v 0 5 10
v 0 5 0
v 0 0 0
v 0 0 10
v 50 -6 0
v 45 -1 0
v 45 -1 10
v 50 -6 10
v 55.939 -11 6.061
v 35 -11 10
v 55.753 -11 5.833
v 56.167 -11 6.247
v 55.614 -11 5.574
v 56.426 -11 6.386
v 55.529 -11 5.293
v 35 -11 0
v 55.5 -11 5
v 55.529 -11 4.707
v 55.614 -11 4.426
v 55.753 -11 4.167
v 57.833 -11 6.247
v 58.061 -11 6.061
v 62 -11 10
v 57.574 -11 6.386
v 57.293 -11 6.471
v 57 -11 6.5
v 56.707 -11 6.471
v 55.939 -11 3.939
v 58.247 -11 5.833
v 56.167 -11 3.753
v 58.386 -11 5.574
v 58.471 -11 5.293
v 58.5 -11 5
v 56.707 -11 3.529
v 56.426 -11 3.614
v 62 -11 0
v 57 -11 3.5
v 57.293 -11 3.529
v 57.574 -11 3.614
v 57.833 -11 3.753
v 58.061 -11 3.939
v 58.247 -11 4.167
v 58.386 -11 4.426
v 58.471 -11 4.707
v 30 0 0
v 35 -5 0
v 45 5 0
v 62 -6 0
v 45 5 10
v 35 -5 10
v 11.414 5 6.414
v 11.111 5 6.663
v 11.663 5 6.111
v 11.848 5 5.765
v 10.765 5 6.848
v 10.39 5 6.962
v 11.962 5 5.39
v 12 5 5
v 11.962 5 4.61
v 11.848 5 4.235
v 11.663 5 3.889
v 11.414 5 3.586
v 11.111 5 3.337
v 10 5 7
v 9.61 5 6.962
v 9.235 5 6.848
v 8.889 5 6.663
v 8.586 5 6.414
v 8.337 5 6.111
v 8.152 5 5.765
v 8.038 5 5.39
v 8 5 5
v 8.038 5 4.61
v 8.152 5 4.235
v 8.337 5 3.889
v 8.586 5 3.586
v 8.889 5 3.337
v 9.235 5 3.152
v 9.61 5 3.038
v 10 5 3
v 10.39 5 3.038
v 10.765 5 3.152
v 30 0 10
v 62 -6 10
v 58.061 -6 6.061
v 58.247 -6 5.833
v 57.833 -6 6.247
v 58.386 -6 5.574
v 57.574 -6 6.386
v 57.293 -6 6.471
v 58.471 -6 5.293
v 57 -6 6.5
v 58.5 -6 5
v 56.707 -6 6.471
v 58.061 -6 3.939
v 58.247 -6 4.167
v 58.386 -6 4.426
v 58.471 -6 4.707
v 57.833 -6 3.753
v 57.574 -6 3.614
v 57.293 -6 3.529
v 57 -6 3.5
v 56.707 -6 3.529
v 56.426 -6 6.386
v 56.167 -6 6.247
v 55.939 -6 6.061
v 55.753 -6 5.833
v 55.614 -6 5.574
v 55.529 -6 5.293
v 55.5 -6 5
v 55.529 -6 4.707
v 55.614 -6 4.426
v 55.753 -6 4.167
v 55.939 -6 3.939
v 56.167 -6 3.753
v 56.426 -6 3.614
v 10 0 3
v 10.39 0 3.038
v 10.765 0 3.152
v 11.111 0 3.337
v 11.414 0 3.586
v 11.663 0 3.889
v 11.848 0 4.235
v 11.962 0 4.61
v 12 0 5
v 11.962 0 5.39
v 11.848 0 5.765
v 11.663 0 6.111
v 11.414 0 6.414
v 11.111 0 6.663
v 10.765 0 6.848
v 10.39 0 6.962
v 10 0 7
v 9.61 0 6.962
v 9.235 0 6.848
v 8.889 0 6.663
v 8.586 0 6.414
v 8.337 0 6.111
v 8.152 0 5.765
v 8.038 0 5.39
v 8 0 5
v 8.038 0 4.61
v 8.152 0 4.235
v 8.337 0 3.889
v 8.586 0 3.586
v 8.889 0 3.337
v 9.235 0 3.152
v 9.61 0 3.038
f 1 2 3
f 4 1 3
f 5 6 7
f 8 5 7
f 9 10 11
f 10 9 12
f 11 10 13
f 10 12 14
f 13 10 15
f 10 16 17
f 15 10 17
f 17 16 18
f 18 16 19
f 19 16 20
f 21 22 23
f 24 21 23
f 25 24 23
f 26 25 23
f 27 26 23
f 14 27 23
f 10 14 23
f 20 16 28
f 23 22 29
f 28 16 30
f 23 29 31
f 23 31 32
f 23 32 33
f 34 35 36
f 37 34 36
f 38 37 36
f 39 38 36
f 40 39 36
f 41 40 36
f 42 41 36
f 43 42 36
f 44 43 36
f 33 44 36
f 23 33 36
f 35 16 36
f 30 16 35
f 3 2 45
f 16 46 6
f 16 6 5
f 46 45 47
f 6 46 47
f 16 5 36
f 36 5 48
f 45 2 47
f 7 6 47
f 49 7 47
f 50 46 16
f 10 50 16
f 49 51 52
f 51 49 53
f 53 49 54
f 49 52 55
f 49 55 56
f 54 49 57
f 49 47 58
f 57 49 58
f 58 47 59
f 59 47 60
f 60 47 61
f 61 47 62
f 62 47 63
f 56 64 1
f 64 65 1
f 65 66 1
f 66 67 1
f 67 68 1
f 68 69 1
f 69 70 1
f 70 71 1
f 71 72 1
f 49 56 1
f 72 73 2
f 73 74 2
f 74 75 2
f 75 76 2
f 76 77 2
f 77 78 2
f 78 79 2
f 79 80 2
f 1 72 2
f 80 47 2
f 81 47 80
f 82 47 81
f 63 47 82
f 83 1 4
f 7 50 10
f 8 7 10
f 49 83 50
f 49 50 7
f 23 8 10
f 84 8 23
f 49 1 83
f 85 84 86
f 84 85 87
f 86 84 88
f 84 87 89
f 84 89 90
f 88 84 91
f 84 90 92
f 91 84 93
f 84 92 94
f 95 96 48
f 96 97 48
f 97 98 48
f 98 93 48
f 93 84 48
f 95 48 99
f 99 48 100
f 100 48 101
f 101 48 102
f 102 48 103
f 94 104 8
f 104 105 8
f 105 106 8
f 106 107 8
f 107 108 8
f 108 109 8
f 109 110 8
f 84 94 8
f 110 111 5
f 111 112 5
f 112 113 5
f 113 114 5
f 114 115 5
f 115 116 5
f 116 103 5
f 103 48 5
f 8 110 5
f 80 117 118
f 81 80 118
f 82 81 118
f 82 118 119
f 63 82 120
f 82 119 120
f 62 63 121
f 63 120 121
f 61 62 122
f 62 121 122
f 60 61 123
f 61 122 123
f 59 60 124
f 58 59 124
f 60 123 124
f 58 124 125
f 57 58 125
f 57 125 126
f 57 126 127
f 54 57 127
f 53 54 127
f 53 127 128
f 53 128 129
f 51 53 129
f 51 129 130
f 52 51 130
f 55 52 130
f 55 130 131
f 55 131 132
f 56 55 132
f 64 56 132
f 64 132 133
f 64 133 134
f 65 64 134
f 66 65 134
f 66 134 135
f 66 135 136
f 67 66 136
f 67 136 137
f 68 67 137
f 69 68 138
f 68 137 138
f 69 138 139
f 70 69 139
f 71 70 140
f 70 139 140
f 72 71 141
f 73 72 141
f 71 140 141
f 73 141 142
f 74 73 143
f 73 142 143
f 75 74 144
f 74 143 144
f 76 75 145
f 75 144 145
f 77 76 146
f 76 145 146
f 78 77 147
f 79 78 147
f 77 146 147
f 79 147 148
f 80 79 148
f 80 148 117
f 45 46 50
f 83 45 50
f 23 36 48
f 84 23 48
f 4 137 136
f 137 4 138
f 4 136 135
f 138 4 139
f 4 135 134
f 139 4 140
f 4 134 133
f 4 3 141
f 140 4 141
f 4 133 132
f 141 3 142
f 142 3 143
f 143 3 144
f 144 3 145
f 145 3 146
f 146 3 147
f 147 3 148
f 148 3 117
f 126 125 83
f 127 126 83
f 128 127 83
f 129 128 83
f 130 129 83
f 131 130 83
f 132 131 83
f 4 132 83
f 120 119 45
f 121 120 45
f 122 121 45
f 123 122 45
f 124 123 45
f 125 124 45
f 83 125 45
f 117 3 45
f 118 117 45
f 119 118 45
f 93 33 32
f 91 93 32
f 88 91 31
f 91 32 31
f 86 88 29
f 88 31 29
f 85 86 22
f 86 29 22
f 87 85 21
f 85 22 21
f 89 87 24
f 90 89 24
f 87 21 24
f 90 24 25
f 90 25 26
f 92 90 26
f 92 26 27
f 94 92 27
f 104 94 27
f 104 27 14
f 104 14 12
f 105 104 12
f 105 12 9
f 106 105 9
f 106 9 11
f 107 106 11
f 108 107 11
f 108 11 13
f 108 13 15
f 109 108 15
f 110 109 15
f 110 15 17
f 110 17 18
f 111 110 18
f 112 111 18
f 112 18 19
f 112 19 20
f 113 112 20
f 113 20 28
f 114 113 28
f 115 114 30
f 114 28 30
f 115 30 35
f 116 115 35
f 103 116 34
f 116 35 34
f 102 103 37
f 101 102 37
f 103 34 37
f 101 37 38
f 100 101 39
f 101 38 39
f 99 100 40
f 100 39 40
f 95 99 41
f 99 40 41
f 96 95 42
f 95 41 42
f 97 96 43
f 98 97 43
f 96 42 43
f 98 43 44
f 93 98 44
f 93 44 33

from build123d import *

# Parameters (mm, degrees)
EXTRUDE_1_DEPTH     = 10
SKETCH_3_R          = 2
SKETCH_3_R_2        = 1.5
CUT_EXTRUDE_1_DEPTH = 30
CHAMFER_1_SIZE      = 5


with BuildPart() as part:
    # 草图1 → 凸台-拉伸1 (new body)
    with BuildSketch(Plane.XY):
        Polygon((0, 0), (35, 0), (35, -11), (62, -11), (62, -6), (45, -6), (45, 5), (0, 5), align=None)
    extrude(amount=EXTRUDE_1_DEPTH)

    # 草图3 → 切除-拉伸1 (cut)
    with BuildSketch(Plane.XZ.offset(11)):
        with Locations(Location((10, 5, 0), (0, 0, 270))):
            Circle(SKETCH_3_R)
        with Locations((57, 5)):
            Circle(SKETCH_3_R_2)
    extrude(amount=-CUT_EXTRUDE_1_DEPTH, mode=Mode.SUBTRACT)

    # 倒角1
    chamfer_1_edges = [part.edges().sort_by_distance(p)[0] for p in [
        (45, -6, 5),
        (35, 0, 5),
    ]]
    chamfer(chamfer_1_edges, length=CHAMFER_1_SIZE)


solid = part.part
